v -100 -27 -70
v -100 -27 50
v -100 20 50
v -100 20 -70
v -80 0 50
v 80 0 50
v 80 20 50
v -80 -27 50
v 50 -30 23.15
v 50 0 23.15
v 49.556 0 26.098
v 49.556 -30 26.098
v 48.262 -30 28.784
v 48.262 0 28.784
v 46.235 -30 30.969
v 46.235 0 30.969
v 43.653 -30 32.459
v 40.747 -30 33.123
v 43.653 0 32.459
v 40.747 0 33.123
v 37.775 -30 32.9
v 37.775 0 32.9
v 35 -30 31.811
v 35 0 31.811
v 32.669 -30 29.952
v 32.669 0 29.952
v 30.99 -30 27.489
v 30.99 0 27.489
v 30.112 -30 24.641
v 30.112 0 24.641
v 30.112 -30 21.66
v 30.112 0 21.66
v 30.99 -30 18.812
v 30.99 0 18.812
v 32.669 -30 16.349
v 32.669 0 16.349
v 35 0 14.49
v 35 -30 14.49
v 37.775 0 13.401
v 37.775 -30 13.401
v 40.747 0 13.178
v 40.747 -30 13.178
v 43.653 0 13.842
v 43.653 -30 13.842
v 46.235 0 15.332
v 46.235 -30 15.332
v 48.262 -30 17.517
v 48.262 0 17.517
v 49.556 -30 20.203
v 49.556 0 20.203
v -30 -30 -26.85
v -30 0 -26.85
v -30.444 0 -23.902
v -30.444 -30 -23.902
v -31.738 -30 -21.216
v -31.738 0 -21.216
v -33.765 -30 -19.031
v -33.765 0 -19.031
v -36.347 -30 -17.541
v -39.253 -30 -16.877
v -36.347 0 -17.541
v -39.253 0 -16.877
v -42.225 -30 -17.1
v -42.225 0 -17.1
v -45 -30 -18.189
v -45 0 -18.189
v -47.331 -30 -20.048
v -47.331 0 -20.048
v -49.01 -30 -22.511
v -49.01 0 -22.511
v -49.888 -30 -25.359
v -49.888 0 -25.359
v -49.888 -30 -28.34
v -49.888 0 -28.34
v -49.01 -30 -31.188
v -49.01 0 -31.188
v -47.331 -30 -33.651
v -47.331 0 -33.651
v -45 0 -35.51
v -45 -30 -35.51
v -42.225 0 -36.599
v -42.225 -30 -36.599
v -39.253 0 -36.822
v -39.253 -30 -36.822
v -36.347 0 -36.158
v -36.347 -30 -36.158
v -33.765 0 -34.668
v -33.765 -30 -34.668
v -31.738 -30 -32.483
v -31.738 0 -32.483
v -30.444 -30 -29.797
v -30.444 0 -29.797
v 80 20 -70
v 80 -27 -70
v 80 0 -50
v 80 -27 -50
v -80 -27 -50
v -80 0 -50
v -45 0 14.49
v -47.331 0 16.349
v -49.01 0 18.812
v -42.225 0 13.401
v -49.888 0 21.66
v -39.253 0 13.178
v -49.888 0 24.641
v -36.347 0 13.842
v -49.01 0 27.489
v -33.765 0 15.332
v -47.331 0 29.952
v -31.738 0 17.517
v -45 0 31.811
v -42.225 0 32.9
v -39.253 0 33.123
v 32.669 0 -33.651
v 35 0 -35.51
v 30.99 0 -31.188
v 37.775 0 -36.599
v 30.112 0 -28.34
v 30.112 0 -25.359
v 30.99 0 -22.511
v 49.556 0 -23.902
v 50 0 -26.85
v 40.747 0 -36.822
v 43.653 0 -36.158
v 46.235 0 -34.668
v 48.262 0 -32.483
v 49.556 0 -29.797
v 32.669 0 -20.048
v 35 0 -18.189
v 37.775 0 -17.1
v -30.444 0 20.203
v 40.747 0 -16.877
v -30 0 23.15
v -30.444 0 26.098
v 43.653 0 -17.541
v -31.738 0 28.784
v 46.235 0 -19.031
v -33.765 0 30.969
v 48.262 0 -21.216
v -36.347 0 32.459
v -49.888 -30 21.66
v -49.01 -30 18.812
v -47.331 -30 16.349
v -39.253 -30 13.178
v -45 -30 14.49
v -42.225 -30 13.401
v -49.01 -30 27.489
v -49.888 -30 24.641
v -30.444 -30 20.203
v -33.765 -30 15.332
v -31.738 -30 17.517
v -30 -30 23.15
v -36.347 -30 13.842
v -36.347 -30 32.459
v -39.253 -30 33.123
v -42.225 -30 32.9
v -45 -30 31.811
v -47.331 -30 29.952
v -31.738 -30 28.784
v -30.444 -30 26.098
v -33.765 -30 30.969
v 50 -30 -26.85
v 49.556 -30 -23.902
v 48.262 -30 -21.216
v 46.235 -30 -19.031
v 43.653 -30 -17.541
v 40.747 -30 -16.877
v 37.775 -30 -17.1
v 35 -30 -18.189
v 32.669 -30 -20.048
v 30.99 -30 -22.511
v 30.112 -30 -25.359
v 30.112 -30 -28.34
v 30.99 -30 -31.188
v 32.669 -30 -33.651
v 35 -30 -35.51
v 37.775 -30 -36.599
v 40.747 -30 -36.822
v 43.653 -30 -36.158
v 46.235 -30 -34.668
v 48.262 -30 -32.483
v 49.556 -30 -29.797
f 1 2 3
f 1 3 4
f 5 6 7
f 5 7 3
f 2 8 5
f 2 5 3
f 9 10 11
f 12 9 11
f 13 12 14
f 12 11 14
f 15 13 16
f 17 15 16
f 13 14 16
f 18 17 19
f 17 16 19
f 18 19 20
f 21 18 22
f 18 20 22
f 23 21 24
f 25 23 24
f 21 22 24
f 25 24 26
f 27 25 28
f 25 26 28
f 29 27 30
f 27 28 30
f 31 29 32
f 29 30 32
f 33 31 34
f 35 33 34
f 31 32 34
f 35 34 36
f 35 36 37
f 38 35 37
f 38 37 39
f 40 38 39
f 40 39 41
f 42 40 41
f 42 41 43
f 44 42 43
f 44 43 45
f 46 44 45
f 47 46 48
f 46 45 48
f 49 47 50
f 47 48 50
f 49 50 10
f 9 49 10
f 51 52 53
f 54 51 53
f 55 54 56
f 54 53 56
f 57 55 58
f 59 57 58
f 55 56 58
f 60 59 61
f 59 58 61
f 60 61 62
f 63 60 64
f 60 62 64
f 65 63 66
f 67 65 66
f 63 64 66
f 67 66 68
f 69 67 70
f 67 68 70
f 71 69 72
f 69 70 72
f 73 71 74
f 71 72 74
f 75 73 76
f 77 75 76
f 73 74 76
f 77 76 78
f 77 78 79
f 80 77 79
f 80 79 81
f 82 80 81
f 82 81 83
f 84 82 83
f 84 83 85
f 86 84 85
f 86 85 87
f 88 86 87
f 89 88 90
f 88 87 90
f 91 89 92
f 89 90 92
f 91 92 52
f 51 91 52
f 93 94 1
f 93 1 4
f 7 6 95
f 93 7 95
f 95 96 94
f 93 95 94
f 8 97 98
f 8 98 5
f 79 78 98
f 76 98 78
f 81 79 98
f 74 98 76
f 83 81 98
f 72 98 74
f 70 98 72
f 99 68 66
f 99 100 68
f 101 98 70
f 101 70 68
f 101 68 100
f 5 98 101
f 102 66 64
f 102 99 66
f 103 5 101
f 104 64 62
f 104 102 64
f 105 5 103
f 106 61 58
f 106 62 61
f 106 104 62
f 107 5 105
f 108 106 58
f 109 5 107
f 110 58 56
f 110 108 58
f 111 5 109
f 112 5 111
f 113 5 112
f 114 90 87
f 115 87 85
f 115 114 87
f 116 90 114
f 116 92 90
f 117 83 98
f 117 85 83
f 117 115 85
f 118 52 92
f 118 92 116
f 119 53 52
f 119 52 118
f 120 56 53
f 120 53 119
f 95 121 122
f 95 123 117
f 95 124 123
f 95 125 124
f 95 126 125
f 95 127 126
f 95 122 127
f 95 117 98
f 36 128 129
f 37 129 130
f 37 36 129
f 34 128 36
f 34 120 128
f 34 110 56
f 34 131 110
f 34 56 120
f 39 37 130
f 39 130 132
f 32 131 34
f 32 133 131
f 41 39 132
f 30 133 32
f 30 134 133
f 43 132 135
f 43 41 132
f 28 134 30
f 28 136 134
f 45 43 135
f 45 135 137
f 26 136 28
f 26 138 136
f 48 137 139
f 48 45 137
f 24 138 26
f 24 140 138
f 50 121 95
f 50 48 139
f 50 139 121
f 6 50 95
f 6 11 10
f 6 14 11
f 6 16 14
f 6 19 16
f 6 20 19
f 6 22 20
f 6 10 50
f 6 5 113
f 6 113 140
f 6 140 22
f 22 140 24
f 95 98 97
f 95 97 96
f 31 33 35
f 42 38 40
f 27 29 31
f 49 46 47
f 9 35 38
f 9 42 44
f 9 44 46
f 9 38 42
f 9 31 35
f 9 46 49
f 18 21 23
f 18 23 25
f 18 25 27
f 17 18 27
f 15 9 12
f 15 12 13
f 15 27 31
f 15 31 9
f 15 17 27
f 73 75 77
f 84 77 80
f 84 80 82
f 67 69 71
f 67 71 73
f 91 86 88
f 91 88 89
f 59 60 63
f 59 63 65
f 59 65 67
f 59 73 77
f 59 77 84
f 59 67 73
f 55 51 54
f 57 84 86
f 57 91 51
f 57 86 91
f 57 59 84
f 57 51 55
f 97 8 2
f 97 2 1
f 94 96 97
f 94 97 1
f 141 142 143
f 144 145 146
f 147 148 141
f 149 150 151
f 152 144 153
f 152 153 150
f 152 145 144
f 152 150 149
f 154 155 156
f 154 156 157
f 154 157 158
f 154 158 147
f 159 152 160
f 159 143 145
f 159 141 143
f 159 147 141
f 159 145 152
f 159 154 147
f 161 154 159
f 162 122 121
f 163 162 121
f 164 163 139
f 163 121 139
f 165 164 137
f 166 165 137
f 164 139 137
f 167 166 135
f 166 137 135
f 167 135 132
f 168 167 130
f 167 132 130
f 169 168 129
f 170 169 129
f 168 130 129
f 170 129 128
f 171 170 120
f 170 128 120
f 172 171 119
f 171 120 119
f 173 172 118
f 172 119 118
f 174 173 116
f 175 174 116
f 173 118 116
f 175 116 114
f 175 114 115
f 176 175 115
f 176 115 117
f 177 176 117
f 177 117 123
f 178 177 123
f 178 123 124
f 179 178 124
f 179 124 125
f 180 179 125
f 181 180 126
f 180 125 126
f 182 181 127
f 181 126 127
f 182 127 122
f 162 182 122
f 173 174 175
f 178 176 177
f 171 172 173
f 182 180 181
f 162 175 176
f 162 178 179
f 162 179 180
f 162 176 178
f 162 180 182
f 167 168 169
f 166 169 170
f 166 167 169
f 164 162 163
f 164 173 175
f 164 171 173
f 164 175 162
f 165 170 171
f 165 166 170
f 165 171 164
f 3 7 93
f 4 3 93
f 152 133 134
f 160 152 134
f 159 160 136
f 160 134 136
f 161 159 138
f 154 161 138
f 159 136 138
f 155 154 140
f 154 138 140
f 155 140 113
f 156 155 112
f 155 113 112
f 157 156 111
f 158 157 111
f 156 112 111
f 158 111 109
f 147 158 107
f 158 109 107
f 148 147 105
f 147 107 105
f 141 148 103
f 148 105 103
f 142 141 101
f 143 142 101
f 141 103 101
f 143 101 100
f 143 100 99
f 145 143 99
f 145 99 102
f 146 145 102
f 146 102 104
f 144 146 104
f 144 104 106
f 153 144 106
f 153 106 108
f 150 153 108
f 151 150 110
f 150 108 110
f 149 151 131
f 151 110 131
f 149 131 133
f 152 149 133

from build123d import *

# Parameters (mm, degrees)
F0_W      = 160
F0_H      = 100
F1_DEPTH  = 20
F3_W      = 27
F3_H      = 100
F4_DEPTH  = 20
F5_DEPTH  = 20
F6_R      = 10
F7_DEPTH  = 30
F9_W      = 160
F9_H      = 27
F10_DEPTH = 20
F11_DEPTH = 20
F12_DEPTH = 20
F13_DEPTH = 20


with BuildPart() as f1:
    # F0 (on Front) → F1 (new body)
    with BuildSketch(Plane.XZ):
        Rectangle(F0_W, F0_H)
    extrude(amount=-F1_DEPTH)

    # F3 (on offset) → F4 (join)
    with BuildSketch(Plane.YZ.offset(-80)):
        with Locations((-13.5, 0)):
            Rectangle(F3_W, F3_H)
    extrude(amount=-F4_DEPTH)

    # F5 (add): faces of the model
    f5_faces = [f1.faces().sort_by_distance(p)[0] for p in [
        (-90, -27, 0),
        (-90, 0, 0),
    ]]
    extrude(f5_faces, amount=-F5_DEPTH, dir=(0, -1, 0))

    # F6 (on face) → F7 (join)
    with BuildSketch(Plane.XZ):
        with Locations((-40, -26.8495120108)):
            Circle(F6_R)
        with Locations((-40, 23.1504879892)):
            Circle(F6_R)
        with Locations((40, -26.8495120108)):
            Circle(F6_R)
        with Locations((40, 23.1504879892)):
            Circle(F6_R)
    extrude(amount=F7_DEPTH)



with BuildPart() as f10:
    # F9 (on offset) → F10 (new body)
    with BuildSketch(Plane.XY.offset(-50)):
        with Locations((0, -13.5)):
            Rectangle(F9_W, F9_H)
    extrude(amount=-F10_DEPTH)


with BuildPart() as f11:
    # F11 (new, through all): a face of the model
    f11_faces = [f10.part.faces().sort_by_distance(p)[0] for p in [
        (0, 0, -60),
    ]]
    extrude(f11_faces, amount=F11_DEPTH)


with BuildPart() as f12:
    # F12 (new, through all): a face of the model
    f12_faces = [f10.part.faces().sort_by_distance(p)[0] for p in [
        (-80, -13.5, -60),
    ]]
    extrude(f12_faces, amount=F12_DEPTH)


with BuildPart() as f1_1:
    add(f1.part)
    # F13 (add, through all): a face of the model
    f13_faces = [f11.part.faces().sort_by_distance(p)[0] for p in [
        (-80, 10, -60),
    ]]

    add(f10.part)  # F13 merges F10

    add(f11.part)  # F13 merges F11

    add(f12.part)  # F13 merges F12
    extrude(f13_faces, amount=F13_DEPTH)


solid = f1_1.part
